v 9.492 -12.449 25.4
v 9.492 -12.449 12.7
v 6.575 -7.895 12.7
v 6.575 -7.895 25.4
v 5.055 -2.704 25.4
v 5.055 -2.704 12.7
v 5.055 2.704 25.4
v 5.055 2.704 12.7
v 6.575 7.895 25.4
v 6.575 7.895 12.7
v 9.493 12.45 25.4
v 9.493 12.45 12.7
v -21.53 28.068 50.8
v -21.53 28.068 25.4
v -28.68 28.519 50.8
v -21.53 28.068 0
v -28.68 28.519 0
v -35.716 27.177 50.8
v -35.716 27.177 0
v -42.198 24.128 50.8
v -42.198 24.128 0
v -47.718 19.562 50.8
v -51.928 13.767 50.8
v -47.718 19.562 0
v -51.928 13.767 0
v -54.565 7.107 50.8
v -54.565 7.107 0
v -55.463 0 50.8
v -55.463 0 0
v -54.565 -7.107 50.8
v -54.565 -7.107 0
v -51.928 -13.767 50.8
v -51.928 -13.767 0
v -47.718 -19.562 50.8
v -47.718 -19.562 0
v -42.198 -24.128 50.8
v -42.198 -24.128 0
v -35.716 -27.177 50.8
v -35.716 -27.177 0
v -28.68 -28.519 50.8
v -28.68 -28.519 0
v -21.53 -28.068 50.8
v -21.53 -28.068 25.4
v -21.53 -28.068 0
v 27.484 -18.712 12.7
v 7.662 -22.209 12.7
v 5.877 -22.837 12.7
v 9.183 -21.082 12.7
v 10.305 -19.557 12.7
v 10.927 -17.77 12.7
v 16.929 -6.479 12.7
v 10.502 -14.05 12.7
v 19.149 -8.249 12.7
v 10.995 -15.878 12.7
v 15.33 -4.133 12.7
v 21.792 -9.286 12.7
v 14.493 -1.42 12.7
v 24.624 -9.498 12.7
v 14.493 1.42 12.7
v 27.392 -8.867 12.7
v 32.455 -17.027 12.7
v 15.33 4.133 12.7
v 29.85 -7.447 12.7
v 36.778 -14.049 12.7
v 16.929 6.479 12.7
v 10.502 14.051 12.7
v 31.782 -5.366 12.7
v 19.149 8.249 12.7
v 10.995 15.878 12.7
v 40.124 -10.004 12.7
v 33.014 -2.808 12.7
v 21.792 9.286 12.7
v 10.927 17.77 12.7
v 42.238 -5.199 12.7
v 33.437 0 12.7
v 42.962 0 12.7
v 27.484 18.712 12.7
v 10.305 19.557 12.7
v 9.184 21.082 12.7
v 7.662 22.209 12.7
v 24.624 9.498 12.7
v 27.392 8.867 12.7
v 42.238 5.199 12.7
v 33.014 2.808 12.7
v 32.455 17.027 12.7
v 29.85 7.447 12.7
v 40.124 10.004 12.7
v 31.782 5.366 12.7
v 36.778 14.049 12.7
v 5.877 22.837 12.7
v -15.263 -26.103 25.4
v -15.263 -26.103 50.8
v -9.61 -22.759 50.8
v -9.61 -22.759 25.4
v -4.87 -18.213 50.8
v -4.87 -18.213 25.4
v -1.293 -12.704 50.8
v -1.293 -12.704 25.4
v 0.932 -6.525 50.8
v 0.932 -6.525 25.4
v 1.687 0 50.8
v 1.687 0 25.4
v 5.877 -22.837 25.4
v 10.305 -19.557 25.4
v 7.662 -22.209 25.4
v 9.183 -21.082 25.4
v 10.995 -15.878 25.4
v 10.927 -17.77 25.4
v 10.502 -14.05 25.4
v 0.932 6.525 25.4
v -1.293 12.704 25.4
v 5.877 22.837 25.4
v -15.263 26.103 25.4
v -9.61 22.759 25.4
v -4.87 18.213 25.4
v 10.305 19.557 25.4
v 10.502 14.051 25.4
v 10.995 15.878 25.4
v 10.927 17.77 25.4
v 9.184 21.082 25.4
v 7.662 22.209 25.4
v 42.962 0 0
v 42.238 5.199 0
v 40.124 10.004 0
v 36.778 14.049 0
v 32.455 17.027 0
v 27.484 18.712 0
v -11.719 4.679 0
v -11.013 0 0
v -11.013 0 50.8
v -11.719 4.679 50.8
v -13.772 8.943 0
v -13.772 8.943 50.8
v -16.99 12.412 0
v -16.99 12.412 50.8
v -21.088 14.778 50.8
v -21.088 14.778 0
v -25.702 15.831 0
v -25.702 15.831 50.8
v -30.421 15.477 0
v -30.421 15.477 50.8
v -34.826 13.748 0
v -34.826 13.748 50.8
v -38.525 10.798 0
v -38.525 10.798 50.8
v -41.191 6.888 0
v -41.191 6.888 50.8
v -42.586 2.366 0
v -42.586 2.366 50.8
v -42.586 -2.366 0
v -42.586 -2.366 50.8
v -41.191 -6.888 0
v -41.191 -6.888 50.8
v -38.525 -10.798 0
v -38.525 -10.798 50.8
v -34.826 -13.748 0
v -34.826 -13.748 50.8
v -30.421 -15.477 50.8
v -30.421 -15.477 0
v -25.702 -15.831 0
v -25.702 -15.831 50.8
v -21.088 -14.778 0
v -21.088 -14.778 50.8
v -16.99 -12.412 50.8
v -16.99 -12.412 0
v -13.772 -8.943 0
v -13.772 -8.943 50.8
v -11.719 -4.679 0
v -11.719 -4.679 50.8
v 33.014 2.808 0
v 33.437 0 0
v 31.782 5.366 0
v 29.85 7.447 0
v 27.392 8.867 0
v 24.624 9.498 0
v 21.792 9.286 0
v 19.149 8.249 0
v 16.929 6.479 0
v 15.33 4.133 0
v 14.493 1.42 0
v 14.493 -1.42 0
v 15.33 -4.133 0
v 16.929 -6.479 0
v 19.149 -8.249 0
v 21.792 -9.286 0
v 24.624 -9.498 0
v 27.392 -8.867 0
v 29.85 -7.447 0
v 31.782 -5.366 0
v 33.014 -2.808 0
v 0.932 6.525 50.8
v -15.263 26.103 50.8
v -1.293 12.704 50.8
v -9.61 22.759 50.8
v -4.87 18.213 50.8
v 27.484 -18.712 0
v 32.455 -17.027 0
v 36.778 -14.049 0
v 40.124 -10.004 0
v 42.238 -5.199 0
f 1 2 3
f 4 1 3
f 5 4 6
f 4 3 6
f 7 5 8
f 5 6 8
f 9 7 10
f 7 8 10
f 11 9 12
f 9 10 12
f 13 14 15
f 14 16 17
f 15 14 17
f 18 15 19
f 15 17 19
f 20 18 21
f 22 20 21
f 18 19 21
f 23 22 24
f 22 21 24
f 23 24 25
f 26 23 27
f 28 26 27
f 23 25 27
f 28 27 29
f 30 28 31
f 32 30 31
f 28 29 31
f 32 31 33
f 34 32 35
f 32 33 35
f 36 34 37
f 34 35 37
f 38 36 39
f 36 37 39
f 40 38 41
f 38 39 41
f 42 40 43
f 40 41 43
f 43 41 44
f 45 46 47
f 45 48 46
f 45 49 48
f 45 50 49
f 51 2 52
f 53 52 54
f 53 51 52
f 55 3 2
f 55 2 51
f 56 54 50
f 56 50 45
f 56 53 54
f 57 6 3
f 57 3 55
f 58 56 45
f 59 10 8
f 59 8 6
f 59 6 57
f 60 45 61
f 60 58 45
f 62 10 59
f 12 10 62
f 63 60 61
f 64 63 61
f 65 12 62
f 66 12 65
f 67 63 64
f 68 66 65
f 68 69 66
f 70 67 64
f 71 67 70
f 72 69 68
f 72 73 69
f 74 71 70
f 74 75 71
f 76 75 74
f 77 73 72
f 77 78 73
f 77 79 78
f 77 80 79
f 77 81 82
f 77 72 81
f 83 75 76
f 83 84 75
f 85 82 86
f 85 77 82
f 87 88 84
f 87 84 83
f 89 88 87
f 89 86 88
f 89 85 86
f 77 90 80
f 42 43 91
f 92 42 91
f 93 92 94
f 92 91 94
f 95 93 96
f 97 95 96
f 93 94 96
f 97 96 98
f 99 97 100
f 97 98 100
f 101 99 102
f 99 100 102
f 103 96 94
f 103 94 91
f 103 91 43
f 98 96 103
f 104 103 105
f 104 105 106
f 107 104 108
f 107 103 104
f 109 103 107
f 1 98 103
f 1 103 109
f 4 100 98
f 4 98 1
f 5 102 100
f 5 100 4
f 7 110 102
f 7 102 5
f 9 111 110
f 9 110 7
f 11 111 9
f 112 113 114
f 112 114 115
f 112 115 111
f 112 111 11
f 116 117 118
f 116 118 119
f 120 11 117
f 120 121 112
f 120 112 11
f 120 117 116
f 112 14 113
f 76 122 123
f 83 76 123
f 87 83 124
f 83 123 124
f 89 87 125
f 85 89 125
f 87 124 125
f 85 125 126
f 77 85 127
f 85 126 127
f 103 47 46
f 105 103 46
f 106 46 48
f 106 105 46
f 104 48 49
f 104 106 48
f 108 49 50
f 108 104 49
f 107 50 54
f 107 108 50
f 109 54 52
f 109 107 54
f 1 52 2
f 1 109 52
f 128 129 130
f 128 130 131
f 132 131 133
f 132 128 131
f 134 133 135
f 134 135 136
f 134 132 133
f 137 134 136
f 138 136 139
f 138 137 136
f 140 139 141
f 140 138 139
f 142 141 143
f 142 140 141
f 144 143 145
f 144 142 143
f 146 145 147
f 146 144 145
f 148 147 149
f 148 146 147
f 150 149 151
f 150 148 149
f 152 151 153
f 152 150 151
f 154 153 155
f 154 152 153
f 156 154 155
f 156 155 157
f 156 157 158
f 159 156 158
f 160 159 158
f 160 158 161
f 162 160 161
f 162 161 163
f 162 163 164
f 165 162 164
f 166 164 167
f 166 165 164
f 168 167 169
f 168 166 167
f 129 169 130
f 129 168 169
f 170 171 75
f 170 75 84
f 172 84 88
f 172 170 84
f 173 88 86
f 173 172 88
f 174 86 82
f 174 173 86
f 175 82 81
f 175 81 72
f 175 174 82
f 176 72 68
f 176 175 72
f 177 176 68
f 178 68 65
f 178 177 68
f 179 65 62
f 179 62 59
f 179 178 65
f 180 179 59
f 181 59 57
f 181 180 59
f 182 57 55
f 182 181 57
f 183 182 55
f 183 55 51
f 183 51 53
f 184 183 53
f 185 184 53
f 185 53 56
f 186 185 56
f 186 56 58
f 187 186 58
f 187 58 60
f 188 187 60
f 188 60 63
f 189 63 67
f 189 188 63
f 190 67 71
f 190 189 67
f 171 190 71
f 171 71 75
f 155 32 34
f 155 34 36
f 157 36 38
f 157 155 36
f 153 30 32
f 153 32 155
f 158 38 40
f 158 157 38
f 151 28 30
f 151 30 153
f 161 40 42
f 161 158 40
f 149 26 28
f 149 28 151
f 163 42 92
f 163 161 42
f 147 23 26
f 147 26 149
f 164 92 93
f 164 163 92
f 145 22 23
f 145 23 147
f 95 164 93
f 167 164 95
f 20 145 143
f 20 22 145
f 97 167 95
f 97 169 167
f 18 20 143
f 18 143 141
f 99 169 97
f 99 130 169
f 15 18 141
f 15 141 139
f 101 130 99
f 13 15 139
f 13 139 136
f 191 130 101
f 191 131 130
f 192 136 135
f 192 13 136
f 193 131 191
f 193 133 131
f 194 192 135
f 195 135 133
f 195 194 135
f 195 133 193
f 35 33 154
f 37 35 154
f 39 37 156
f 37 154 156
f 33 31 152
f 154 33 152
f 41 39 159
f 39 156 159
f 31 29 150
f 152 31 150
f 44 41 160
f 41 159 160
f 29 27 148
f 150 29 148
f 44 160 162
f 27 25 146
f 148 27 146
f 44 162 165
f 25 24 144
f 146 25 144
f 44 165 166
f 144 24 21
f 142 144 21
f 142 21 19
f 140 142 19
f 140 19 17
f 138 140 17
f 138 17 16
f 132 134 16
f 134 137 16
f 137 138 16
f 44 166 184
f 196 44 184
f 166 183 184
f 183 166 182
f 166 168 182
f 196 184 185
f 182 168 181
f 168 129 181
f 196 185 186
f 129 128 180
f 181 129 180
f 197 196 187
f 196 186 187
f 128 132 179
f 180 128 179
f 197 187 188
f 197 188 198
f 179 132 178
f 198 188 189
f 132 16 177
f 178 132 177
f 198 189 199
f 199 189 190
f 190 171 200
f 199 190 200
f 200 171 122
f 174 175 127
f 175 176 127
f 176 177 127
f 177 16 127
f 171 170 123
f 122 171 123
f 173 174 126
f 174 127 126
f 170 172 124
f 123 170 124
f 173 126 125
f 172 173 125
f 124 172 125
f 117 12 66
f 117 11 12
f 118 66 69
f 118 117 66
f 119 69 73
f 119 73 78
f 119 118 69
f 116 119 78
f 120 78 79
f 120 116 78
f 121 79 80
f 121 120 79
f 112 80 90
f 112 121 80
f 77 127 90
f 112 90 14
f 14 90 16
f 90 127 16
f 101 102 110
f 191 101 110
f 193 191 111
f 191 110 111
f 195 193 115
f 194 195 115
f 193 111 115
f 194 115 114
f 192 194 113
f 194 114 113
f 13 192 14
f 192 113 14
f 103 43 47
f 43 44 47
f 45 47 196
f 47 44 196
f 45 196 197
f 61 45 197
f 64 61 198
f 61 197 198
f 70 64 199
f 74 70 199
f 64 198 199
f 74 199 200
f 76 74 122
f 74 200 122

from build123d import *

# Parameters (mm, degrees)
F0_R     = 15.875
F1_DEPTH = 50.8
F2_DEPTH = 25.4
F0_R_2   = 9.525
F3_DEPTH = 12.7
F4_R     = 6.35
F4_R_2   = 6.3499


# Not quite as in the source:
# - a fillet or chamfer is up to 0.001 mm smaller than in the source, because OpenCascade refuses the exact size


with BuildPart() as f1:
    # F0 (on Top) → F1 (new body)
    with BuildSketch(Plane.XY):
        with BuildLine():
            ThreePointArc((-21.53046875, -28.0682110263), (-4.8697649831, -18.2130603251), (1.68671875, 0))
            ThreePointArc((1.68671875, 0), (-4.8697649831, 18.2130603251), (-21.53046875, 28.0682110263))
            ThreePointArc((-21.53046875, 28.0682110263), (-55.46328125, 0), (-21.53046875, -28.0682110263))
        make_face()
        with Locations((-26.88828125, 0)):
            Circle(F0_R, mode=Mode.SUBTRACT)
    extrude(amount=F1_DEPTH)

    # F0 (on Top) → F2 (join)
    with BuildSketch(Plane.XY):
        with BuildLine():
            ThreePointArc((-21.53046875, 28.0682110263), (-4.8697649831, 18.2130603251), (1.68671875, 0))
            ThreePointArc((1.68671875, 0), (-4.8697649831, -18.2130603251), (-21.53046875, -28.0682110263))
            Line((-21.53046875, -28.0682110263), (27.48359375, -18.7121406842))
            ThreePointArc((27.48359375, -18.7121406842), (4.86171875, 0), (27.48359375, 18.7121406842))
            Line((27.48359375, 18.7121406842), (-21.53046875, 28.0682110263))
        make_face()
    extrude(amount=F2_DEPTH)

    # F0 (on Top) → F3 (join)
    with BuildSketch(Plane.XY):
        with BuildLine():
            ThreePointArc((42.96171875, 0), (38.5907295946, 12.1420402167), (27.48359375, 18.7121406842))
            ThreePointArc((27.48359375, 18.7121406842), (4.86171875, 0), (27.48359375, -18.7121406842))
            ThreePointArc((27.48359375, -18.7121406842), (38.5907295946, -12.1420402167), (42.96171875, 0))
        make_face()
        with Locations((23.91171875, 0)):
            Circle(F0_R_2, mode=Mode.SUBTRACT)
    extrude(amount=F3_DEPTH)

    # F4 (call 1 of 2: OpenCascade refuses the feature's edges together)
    f4_edges = [f1.edges().sort_by_distance(p)[0] for p in [
        (27.483594, -18.712141, 6.35),
        (27.483594, -18.712141, 19.05),
    ]]
    fillet(f4_edges, radius=F4_R)

    # F4#2 (call 2 of 2) (radius 6.35 in the source; OpenCascade refuses exactly that, so slightly less here)
    f4_2_edges = [f1.edges().sort_by_distance(p)[0] for p in [
        (27.483594, 18.712141, 6.35),
        (27.483594, 18.712141, 19.05),
    ]]
    fillet(f4_2_edges, radius=F4_R_2)


solid = f1.part
